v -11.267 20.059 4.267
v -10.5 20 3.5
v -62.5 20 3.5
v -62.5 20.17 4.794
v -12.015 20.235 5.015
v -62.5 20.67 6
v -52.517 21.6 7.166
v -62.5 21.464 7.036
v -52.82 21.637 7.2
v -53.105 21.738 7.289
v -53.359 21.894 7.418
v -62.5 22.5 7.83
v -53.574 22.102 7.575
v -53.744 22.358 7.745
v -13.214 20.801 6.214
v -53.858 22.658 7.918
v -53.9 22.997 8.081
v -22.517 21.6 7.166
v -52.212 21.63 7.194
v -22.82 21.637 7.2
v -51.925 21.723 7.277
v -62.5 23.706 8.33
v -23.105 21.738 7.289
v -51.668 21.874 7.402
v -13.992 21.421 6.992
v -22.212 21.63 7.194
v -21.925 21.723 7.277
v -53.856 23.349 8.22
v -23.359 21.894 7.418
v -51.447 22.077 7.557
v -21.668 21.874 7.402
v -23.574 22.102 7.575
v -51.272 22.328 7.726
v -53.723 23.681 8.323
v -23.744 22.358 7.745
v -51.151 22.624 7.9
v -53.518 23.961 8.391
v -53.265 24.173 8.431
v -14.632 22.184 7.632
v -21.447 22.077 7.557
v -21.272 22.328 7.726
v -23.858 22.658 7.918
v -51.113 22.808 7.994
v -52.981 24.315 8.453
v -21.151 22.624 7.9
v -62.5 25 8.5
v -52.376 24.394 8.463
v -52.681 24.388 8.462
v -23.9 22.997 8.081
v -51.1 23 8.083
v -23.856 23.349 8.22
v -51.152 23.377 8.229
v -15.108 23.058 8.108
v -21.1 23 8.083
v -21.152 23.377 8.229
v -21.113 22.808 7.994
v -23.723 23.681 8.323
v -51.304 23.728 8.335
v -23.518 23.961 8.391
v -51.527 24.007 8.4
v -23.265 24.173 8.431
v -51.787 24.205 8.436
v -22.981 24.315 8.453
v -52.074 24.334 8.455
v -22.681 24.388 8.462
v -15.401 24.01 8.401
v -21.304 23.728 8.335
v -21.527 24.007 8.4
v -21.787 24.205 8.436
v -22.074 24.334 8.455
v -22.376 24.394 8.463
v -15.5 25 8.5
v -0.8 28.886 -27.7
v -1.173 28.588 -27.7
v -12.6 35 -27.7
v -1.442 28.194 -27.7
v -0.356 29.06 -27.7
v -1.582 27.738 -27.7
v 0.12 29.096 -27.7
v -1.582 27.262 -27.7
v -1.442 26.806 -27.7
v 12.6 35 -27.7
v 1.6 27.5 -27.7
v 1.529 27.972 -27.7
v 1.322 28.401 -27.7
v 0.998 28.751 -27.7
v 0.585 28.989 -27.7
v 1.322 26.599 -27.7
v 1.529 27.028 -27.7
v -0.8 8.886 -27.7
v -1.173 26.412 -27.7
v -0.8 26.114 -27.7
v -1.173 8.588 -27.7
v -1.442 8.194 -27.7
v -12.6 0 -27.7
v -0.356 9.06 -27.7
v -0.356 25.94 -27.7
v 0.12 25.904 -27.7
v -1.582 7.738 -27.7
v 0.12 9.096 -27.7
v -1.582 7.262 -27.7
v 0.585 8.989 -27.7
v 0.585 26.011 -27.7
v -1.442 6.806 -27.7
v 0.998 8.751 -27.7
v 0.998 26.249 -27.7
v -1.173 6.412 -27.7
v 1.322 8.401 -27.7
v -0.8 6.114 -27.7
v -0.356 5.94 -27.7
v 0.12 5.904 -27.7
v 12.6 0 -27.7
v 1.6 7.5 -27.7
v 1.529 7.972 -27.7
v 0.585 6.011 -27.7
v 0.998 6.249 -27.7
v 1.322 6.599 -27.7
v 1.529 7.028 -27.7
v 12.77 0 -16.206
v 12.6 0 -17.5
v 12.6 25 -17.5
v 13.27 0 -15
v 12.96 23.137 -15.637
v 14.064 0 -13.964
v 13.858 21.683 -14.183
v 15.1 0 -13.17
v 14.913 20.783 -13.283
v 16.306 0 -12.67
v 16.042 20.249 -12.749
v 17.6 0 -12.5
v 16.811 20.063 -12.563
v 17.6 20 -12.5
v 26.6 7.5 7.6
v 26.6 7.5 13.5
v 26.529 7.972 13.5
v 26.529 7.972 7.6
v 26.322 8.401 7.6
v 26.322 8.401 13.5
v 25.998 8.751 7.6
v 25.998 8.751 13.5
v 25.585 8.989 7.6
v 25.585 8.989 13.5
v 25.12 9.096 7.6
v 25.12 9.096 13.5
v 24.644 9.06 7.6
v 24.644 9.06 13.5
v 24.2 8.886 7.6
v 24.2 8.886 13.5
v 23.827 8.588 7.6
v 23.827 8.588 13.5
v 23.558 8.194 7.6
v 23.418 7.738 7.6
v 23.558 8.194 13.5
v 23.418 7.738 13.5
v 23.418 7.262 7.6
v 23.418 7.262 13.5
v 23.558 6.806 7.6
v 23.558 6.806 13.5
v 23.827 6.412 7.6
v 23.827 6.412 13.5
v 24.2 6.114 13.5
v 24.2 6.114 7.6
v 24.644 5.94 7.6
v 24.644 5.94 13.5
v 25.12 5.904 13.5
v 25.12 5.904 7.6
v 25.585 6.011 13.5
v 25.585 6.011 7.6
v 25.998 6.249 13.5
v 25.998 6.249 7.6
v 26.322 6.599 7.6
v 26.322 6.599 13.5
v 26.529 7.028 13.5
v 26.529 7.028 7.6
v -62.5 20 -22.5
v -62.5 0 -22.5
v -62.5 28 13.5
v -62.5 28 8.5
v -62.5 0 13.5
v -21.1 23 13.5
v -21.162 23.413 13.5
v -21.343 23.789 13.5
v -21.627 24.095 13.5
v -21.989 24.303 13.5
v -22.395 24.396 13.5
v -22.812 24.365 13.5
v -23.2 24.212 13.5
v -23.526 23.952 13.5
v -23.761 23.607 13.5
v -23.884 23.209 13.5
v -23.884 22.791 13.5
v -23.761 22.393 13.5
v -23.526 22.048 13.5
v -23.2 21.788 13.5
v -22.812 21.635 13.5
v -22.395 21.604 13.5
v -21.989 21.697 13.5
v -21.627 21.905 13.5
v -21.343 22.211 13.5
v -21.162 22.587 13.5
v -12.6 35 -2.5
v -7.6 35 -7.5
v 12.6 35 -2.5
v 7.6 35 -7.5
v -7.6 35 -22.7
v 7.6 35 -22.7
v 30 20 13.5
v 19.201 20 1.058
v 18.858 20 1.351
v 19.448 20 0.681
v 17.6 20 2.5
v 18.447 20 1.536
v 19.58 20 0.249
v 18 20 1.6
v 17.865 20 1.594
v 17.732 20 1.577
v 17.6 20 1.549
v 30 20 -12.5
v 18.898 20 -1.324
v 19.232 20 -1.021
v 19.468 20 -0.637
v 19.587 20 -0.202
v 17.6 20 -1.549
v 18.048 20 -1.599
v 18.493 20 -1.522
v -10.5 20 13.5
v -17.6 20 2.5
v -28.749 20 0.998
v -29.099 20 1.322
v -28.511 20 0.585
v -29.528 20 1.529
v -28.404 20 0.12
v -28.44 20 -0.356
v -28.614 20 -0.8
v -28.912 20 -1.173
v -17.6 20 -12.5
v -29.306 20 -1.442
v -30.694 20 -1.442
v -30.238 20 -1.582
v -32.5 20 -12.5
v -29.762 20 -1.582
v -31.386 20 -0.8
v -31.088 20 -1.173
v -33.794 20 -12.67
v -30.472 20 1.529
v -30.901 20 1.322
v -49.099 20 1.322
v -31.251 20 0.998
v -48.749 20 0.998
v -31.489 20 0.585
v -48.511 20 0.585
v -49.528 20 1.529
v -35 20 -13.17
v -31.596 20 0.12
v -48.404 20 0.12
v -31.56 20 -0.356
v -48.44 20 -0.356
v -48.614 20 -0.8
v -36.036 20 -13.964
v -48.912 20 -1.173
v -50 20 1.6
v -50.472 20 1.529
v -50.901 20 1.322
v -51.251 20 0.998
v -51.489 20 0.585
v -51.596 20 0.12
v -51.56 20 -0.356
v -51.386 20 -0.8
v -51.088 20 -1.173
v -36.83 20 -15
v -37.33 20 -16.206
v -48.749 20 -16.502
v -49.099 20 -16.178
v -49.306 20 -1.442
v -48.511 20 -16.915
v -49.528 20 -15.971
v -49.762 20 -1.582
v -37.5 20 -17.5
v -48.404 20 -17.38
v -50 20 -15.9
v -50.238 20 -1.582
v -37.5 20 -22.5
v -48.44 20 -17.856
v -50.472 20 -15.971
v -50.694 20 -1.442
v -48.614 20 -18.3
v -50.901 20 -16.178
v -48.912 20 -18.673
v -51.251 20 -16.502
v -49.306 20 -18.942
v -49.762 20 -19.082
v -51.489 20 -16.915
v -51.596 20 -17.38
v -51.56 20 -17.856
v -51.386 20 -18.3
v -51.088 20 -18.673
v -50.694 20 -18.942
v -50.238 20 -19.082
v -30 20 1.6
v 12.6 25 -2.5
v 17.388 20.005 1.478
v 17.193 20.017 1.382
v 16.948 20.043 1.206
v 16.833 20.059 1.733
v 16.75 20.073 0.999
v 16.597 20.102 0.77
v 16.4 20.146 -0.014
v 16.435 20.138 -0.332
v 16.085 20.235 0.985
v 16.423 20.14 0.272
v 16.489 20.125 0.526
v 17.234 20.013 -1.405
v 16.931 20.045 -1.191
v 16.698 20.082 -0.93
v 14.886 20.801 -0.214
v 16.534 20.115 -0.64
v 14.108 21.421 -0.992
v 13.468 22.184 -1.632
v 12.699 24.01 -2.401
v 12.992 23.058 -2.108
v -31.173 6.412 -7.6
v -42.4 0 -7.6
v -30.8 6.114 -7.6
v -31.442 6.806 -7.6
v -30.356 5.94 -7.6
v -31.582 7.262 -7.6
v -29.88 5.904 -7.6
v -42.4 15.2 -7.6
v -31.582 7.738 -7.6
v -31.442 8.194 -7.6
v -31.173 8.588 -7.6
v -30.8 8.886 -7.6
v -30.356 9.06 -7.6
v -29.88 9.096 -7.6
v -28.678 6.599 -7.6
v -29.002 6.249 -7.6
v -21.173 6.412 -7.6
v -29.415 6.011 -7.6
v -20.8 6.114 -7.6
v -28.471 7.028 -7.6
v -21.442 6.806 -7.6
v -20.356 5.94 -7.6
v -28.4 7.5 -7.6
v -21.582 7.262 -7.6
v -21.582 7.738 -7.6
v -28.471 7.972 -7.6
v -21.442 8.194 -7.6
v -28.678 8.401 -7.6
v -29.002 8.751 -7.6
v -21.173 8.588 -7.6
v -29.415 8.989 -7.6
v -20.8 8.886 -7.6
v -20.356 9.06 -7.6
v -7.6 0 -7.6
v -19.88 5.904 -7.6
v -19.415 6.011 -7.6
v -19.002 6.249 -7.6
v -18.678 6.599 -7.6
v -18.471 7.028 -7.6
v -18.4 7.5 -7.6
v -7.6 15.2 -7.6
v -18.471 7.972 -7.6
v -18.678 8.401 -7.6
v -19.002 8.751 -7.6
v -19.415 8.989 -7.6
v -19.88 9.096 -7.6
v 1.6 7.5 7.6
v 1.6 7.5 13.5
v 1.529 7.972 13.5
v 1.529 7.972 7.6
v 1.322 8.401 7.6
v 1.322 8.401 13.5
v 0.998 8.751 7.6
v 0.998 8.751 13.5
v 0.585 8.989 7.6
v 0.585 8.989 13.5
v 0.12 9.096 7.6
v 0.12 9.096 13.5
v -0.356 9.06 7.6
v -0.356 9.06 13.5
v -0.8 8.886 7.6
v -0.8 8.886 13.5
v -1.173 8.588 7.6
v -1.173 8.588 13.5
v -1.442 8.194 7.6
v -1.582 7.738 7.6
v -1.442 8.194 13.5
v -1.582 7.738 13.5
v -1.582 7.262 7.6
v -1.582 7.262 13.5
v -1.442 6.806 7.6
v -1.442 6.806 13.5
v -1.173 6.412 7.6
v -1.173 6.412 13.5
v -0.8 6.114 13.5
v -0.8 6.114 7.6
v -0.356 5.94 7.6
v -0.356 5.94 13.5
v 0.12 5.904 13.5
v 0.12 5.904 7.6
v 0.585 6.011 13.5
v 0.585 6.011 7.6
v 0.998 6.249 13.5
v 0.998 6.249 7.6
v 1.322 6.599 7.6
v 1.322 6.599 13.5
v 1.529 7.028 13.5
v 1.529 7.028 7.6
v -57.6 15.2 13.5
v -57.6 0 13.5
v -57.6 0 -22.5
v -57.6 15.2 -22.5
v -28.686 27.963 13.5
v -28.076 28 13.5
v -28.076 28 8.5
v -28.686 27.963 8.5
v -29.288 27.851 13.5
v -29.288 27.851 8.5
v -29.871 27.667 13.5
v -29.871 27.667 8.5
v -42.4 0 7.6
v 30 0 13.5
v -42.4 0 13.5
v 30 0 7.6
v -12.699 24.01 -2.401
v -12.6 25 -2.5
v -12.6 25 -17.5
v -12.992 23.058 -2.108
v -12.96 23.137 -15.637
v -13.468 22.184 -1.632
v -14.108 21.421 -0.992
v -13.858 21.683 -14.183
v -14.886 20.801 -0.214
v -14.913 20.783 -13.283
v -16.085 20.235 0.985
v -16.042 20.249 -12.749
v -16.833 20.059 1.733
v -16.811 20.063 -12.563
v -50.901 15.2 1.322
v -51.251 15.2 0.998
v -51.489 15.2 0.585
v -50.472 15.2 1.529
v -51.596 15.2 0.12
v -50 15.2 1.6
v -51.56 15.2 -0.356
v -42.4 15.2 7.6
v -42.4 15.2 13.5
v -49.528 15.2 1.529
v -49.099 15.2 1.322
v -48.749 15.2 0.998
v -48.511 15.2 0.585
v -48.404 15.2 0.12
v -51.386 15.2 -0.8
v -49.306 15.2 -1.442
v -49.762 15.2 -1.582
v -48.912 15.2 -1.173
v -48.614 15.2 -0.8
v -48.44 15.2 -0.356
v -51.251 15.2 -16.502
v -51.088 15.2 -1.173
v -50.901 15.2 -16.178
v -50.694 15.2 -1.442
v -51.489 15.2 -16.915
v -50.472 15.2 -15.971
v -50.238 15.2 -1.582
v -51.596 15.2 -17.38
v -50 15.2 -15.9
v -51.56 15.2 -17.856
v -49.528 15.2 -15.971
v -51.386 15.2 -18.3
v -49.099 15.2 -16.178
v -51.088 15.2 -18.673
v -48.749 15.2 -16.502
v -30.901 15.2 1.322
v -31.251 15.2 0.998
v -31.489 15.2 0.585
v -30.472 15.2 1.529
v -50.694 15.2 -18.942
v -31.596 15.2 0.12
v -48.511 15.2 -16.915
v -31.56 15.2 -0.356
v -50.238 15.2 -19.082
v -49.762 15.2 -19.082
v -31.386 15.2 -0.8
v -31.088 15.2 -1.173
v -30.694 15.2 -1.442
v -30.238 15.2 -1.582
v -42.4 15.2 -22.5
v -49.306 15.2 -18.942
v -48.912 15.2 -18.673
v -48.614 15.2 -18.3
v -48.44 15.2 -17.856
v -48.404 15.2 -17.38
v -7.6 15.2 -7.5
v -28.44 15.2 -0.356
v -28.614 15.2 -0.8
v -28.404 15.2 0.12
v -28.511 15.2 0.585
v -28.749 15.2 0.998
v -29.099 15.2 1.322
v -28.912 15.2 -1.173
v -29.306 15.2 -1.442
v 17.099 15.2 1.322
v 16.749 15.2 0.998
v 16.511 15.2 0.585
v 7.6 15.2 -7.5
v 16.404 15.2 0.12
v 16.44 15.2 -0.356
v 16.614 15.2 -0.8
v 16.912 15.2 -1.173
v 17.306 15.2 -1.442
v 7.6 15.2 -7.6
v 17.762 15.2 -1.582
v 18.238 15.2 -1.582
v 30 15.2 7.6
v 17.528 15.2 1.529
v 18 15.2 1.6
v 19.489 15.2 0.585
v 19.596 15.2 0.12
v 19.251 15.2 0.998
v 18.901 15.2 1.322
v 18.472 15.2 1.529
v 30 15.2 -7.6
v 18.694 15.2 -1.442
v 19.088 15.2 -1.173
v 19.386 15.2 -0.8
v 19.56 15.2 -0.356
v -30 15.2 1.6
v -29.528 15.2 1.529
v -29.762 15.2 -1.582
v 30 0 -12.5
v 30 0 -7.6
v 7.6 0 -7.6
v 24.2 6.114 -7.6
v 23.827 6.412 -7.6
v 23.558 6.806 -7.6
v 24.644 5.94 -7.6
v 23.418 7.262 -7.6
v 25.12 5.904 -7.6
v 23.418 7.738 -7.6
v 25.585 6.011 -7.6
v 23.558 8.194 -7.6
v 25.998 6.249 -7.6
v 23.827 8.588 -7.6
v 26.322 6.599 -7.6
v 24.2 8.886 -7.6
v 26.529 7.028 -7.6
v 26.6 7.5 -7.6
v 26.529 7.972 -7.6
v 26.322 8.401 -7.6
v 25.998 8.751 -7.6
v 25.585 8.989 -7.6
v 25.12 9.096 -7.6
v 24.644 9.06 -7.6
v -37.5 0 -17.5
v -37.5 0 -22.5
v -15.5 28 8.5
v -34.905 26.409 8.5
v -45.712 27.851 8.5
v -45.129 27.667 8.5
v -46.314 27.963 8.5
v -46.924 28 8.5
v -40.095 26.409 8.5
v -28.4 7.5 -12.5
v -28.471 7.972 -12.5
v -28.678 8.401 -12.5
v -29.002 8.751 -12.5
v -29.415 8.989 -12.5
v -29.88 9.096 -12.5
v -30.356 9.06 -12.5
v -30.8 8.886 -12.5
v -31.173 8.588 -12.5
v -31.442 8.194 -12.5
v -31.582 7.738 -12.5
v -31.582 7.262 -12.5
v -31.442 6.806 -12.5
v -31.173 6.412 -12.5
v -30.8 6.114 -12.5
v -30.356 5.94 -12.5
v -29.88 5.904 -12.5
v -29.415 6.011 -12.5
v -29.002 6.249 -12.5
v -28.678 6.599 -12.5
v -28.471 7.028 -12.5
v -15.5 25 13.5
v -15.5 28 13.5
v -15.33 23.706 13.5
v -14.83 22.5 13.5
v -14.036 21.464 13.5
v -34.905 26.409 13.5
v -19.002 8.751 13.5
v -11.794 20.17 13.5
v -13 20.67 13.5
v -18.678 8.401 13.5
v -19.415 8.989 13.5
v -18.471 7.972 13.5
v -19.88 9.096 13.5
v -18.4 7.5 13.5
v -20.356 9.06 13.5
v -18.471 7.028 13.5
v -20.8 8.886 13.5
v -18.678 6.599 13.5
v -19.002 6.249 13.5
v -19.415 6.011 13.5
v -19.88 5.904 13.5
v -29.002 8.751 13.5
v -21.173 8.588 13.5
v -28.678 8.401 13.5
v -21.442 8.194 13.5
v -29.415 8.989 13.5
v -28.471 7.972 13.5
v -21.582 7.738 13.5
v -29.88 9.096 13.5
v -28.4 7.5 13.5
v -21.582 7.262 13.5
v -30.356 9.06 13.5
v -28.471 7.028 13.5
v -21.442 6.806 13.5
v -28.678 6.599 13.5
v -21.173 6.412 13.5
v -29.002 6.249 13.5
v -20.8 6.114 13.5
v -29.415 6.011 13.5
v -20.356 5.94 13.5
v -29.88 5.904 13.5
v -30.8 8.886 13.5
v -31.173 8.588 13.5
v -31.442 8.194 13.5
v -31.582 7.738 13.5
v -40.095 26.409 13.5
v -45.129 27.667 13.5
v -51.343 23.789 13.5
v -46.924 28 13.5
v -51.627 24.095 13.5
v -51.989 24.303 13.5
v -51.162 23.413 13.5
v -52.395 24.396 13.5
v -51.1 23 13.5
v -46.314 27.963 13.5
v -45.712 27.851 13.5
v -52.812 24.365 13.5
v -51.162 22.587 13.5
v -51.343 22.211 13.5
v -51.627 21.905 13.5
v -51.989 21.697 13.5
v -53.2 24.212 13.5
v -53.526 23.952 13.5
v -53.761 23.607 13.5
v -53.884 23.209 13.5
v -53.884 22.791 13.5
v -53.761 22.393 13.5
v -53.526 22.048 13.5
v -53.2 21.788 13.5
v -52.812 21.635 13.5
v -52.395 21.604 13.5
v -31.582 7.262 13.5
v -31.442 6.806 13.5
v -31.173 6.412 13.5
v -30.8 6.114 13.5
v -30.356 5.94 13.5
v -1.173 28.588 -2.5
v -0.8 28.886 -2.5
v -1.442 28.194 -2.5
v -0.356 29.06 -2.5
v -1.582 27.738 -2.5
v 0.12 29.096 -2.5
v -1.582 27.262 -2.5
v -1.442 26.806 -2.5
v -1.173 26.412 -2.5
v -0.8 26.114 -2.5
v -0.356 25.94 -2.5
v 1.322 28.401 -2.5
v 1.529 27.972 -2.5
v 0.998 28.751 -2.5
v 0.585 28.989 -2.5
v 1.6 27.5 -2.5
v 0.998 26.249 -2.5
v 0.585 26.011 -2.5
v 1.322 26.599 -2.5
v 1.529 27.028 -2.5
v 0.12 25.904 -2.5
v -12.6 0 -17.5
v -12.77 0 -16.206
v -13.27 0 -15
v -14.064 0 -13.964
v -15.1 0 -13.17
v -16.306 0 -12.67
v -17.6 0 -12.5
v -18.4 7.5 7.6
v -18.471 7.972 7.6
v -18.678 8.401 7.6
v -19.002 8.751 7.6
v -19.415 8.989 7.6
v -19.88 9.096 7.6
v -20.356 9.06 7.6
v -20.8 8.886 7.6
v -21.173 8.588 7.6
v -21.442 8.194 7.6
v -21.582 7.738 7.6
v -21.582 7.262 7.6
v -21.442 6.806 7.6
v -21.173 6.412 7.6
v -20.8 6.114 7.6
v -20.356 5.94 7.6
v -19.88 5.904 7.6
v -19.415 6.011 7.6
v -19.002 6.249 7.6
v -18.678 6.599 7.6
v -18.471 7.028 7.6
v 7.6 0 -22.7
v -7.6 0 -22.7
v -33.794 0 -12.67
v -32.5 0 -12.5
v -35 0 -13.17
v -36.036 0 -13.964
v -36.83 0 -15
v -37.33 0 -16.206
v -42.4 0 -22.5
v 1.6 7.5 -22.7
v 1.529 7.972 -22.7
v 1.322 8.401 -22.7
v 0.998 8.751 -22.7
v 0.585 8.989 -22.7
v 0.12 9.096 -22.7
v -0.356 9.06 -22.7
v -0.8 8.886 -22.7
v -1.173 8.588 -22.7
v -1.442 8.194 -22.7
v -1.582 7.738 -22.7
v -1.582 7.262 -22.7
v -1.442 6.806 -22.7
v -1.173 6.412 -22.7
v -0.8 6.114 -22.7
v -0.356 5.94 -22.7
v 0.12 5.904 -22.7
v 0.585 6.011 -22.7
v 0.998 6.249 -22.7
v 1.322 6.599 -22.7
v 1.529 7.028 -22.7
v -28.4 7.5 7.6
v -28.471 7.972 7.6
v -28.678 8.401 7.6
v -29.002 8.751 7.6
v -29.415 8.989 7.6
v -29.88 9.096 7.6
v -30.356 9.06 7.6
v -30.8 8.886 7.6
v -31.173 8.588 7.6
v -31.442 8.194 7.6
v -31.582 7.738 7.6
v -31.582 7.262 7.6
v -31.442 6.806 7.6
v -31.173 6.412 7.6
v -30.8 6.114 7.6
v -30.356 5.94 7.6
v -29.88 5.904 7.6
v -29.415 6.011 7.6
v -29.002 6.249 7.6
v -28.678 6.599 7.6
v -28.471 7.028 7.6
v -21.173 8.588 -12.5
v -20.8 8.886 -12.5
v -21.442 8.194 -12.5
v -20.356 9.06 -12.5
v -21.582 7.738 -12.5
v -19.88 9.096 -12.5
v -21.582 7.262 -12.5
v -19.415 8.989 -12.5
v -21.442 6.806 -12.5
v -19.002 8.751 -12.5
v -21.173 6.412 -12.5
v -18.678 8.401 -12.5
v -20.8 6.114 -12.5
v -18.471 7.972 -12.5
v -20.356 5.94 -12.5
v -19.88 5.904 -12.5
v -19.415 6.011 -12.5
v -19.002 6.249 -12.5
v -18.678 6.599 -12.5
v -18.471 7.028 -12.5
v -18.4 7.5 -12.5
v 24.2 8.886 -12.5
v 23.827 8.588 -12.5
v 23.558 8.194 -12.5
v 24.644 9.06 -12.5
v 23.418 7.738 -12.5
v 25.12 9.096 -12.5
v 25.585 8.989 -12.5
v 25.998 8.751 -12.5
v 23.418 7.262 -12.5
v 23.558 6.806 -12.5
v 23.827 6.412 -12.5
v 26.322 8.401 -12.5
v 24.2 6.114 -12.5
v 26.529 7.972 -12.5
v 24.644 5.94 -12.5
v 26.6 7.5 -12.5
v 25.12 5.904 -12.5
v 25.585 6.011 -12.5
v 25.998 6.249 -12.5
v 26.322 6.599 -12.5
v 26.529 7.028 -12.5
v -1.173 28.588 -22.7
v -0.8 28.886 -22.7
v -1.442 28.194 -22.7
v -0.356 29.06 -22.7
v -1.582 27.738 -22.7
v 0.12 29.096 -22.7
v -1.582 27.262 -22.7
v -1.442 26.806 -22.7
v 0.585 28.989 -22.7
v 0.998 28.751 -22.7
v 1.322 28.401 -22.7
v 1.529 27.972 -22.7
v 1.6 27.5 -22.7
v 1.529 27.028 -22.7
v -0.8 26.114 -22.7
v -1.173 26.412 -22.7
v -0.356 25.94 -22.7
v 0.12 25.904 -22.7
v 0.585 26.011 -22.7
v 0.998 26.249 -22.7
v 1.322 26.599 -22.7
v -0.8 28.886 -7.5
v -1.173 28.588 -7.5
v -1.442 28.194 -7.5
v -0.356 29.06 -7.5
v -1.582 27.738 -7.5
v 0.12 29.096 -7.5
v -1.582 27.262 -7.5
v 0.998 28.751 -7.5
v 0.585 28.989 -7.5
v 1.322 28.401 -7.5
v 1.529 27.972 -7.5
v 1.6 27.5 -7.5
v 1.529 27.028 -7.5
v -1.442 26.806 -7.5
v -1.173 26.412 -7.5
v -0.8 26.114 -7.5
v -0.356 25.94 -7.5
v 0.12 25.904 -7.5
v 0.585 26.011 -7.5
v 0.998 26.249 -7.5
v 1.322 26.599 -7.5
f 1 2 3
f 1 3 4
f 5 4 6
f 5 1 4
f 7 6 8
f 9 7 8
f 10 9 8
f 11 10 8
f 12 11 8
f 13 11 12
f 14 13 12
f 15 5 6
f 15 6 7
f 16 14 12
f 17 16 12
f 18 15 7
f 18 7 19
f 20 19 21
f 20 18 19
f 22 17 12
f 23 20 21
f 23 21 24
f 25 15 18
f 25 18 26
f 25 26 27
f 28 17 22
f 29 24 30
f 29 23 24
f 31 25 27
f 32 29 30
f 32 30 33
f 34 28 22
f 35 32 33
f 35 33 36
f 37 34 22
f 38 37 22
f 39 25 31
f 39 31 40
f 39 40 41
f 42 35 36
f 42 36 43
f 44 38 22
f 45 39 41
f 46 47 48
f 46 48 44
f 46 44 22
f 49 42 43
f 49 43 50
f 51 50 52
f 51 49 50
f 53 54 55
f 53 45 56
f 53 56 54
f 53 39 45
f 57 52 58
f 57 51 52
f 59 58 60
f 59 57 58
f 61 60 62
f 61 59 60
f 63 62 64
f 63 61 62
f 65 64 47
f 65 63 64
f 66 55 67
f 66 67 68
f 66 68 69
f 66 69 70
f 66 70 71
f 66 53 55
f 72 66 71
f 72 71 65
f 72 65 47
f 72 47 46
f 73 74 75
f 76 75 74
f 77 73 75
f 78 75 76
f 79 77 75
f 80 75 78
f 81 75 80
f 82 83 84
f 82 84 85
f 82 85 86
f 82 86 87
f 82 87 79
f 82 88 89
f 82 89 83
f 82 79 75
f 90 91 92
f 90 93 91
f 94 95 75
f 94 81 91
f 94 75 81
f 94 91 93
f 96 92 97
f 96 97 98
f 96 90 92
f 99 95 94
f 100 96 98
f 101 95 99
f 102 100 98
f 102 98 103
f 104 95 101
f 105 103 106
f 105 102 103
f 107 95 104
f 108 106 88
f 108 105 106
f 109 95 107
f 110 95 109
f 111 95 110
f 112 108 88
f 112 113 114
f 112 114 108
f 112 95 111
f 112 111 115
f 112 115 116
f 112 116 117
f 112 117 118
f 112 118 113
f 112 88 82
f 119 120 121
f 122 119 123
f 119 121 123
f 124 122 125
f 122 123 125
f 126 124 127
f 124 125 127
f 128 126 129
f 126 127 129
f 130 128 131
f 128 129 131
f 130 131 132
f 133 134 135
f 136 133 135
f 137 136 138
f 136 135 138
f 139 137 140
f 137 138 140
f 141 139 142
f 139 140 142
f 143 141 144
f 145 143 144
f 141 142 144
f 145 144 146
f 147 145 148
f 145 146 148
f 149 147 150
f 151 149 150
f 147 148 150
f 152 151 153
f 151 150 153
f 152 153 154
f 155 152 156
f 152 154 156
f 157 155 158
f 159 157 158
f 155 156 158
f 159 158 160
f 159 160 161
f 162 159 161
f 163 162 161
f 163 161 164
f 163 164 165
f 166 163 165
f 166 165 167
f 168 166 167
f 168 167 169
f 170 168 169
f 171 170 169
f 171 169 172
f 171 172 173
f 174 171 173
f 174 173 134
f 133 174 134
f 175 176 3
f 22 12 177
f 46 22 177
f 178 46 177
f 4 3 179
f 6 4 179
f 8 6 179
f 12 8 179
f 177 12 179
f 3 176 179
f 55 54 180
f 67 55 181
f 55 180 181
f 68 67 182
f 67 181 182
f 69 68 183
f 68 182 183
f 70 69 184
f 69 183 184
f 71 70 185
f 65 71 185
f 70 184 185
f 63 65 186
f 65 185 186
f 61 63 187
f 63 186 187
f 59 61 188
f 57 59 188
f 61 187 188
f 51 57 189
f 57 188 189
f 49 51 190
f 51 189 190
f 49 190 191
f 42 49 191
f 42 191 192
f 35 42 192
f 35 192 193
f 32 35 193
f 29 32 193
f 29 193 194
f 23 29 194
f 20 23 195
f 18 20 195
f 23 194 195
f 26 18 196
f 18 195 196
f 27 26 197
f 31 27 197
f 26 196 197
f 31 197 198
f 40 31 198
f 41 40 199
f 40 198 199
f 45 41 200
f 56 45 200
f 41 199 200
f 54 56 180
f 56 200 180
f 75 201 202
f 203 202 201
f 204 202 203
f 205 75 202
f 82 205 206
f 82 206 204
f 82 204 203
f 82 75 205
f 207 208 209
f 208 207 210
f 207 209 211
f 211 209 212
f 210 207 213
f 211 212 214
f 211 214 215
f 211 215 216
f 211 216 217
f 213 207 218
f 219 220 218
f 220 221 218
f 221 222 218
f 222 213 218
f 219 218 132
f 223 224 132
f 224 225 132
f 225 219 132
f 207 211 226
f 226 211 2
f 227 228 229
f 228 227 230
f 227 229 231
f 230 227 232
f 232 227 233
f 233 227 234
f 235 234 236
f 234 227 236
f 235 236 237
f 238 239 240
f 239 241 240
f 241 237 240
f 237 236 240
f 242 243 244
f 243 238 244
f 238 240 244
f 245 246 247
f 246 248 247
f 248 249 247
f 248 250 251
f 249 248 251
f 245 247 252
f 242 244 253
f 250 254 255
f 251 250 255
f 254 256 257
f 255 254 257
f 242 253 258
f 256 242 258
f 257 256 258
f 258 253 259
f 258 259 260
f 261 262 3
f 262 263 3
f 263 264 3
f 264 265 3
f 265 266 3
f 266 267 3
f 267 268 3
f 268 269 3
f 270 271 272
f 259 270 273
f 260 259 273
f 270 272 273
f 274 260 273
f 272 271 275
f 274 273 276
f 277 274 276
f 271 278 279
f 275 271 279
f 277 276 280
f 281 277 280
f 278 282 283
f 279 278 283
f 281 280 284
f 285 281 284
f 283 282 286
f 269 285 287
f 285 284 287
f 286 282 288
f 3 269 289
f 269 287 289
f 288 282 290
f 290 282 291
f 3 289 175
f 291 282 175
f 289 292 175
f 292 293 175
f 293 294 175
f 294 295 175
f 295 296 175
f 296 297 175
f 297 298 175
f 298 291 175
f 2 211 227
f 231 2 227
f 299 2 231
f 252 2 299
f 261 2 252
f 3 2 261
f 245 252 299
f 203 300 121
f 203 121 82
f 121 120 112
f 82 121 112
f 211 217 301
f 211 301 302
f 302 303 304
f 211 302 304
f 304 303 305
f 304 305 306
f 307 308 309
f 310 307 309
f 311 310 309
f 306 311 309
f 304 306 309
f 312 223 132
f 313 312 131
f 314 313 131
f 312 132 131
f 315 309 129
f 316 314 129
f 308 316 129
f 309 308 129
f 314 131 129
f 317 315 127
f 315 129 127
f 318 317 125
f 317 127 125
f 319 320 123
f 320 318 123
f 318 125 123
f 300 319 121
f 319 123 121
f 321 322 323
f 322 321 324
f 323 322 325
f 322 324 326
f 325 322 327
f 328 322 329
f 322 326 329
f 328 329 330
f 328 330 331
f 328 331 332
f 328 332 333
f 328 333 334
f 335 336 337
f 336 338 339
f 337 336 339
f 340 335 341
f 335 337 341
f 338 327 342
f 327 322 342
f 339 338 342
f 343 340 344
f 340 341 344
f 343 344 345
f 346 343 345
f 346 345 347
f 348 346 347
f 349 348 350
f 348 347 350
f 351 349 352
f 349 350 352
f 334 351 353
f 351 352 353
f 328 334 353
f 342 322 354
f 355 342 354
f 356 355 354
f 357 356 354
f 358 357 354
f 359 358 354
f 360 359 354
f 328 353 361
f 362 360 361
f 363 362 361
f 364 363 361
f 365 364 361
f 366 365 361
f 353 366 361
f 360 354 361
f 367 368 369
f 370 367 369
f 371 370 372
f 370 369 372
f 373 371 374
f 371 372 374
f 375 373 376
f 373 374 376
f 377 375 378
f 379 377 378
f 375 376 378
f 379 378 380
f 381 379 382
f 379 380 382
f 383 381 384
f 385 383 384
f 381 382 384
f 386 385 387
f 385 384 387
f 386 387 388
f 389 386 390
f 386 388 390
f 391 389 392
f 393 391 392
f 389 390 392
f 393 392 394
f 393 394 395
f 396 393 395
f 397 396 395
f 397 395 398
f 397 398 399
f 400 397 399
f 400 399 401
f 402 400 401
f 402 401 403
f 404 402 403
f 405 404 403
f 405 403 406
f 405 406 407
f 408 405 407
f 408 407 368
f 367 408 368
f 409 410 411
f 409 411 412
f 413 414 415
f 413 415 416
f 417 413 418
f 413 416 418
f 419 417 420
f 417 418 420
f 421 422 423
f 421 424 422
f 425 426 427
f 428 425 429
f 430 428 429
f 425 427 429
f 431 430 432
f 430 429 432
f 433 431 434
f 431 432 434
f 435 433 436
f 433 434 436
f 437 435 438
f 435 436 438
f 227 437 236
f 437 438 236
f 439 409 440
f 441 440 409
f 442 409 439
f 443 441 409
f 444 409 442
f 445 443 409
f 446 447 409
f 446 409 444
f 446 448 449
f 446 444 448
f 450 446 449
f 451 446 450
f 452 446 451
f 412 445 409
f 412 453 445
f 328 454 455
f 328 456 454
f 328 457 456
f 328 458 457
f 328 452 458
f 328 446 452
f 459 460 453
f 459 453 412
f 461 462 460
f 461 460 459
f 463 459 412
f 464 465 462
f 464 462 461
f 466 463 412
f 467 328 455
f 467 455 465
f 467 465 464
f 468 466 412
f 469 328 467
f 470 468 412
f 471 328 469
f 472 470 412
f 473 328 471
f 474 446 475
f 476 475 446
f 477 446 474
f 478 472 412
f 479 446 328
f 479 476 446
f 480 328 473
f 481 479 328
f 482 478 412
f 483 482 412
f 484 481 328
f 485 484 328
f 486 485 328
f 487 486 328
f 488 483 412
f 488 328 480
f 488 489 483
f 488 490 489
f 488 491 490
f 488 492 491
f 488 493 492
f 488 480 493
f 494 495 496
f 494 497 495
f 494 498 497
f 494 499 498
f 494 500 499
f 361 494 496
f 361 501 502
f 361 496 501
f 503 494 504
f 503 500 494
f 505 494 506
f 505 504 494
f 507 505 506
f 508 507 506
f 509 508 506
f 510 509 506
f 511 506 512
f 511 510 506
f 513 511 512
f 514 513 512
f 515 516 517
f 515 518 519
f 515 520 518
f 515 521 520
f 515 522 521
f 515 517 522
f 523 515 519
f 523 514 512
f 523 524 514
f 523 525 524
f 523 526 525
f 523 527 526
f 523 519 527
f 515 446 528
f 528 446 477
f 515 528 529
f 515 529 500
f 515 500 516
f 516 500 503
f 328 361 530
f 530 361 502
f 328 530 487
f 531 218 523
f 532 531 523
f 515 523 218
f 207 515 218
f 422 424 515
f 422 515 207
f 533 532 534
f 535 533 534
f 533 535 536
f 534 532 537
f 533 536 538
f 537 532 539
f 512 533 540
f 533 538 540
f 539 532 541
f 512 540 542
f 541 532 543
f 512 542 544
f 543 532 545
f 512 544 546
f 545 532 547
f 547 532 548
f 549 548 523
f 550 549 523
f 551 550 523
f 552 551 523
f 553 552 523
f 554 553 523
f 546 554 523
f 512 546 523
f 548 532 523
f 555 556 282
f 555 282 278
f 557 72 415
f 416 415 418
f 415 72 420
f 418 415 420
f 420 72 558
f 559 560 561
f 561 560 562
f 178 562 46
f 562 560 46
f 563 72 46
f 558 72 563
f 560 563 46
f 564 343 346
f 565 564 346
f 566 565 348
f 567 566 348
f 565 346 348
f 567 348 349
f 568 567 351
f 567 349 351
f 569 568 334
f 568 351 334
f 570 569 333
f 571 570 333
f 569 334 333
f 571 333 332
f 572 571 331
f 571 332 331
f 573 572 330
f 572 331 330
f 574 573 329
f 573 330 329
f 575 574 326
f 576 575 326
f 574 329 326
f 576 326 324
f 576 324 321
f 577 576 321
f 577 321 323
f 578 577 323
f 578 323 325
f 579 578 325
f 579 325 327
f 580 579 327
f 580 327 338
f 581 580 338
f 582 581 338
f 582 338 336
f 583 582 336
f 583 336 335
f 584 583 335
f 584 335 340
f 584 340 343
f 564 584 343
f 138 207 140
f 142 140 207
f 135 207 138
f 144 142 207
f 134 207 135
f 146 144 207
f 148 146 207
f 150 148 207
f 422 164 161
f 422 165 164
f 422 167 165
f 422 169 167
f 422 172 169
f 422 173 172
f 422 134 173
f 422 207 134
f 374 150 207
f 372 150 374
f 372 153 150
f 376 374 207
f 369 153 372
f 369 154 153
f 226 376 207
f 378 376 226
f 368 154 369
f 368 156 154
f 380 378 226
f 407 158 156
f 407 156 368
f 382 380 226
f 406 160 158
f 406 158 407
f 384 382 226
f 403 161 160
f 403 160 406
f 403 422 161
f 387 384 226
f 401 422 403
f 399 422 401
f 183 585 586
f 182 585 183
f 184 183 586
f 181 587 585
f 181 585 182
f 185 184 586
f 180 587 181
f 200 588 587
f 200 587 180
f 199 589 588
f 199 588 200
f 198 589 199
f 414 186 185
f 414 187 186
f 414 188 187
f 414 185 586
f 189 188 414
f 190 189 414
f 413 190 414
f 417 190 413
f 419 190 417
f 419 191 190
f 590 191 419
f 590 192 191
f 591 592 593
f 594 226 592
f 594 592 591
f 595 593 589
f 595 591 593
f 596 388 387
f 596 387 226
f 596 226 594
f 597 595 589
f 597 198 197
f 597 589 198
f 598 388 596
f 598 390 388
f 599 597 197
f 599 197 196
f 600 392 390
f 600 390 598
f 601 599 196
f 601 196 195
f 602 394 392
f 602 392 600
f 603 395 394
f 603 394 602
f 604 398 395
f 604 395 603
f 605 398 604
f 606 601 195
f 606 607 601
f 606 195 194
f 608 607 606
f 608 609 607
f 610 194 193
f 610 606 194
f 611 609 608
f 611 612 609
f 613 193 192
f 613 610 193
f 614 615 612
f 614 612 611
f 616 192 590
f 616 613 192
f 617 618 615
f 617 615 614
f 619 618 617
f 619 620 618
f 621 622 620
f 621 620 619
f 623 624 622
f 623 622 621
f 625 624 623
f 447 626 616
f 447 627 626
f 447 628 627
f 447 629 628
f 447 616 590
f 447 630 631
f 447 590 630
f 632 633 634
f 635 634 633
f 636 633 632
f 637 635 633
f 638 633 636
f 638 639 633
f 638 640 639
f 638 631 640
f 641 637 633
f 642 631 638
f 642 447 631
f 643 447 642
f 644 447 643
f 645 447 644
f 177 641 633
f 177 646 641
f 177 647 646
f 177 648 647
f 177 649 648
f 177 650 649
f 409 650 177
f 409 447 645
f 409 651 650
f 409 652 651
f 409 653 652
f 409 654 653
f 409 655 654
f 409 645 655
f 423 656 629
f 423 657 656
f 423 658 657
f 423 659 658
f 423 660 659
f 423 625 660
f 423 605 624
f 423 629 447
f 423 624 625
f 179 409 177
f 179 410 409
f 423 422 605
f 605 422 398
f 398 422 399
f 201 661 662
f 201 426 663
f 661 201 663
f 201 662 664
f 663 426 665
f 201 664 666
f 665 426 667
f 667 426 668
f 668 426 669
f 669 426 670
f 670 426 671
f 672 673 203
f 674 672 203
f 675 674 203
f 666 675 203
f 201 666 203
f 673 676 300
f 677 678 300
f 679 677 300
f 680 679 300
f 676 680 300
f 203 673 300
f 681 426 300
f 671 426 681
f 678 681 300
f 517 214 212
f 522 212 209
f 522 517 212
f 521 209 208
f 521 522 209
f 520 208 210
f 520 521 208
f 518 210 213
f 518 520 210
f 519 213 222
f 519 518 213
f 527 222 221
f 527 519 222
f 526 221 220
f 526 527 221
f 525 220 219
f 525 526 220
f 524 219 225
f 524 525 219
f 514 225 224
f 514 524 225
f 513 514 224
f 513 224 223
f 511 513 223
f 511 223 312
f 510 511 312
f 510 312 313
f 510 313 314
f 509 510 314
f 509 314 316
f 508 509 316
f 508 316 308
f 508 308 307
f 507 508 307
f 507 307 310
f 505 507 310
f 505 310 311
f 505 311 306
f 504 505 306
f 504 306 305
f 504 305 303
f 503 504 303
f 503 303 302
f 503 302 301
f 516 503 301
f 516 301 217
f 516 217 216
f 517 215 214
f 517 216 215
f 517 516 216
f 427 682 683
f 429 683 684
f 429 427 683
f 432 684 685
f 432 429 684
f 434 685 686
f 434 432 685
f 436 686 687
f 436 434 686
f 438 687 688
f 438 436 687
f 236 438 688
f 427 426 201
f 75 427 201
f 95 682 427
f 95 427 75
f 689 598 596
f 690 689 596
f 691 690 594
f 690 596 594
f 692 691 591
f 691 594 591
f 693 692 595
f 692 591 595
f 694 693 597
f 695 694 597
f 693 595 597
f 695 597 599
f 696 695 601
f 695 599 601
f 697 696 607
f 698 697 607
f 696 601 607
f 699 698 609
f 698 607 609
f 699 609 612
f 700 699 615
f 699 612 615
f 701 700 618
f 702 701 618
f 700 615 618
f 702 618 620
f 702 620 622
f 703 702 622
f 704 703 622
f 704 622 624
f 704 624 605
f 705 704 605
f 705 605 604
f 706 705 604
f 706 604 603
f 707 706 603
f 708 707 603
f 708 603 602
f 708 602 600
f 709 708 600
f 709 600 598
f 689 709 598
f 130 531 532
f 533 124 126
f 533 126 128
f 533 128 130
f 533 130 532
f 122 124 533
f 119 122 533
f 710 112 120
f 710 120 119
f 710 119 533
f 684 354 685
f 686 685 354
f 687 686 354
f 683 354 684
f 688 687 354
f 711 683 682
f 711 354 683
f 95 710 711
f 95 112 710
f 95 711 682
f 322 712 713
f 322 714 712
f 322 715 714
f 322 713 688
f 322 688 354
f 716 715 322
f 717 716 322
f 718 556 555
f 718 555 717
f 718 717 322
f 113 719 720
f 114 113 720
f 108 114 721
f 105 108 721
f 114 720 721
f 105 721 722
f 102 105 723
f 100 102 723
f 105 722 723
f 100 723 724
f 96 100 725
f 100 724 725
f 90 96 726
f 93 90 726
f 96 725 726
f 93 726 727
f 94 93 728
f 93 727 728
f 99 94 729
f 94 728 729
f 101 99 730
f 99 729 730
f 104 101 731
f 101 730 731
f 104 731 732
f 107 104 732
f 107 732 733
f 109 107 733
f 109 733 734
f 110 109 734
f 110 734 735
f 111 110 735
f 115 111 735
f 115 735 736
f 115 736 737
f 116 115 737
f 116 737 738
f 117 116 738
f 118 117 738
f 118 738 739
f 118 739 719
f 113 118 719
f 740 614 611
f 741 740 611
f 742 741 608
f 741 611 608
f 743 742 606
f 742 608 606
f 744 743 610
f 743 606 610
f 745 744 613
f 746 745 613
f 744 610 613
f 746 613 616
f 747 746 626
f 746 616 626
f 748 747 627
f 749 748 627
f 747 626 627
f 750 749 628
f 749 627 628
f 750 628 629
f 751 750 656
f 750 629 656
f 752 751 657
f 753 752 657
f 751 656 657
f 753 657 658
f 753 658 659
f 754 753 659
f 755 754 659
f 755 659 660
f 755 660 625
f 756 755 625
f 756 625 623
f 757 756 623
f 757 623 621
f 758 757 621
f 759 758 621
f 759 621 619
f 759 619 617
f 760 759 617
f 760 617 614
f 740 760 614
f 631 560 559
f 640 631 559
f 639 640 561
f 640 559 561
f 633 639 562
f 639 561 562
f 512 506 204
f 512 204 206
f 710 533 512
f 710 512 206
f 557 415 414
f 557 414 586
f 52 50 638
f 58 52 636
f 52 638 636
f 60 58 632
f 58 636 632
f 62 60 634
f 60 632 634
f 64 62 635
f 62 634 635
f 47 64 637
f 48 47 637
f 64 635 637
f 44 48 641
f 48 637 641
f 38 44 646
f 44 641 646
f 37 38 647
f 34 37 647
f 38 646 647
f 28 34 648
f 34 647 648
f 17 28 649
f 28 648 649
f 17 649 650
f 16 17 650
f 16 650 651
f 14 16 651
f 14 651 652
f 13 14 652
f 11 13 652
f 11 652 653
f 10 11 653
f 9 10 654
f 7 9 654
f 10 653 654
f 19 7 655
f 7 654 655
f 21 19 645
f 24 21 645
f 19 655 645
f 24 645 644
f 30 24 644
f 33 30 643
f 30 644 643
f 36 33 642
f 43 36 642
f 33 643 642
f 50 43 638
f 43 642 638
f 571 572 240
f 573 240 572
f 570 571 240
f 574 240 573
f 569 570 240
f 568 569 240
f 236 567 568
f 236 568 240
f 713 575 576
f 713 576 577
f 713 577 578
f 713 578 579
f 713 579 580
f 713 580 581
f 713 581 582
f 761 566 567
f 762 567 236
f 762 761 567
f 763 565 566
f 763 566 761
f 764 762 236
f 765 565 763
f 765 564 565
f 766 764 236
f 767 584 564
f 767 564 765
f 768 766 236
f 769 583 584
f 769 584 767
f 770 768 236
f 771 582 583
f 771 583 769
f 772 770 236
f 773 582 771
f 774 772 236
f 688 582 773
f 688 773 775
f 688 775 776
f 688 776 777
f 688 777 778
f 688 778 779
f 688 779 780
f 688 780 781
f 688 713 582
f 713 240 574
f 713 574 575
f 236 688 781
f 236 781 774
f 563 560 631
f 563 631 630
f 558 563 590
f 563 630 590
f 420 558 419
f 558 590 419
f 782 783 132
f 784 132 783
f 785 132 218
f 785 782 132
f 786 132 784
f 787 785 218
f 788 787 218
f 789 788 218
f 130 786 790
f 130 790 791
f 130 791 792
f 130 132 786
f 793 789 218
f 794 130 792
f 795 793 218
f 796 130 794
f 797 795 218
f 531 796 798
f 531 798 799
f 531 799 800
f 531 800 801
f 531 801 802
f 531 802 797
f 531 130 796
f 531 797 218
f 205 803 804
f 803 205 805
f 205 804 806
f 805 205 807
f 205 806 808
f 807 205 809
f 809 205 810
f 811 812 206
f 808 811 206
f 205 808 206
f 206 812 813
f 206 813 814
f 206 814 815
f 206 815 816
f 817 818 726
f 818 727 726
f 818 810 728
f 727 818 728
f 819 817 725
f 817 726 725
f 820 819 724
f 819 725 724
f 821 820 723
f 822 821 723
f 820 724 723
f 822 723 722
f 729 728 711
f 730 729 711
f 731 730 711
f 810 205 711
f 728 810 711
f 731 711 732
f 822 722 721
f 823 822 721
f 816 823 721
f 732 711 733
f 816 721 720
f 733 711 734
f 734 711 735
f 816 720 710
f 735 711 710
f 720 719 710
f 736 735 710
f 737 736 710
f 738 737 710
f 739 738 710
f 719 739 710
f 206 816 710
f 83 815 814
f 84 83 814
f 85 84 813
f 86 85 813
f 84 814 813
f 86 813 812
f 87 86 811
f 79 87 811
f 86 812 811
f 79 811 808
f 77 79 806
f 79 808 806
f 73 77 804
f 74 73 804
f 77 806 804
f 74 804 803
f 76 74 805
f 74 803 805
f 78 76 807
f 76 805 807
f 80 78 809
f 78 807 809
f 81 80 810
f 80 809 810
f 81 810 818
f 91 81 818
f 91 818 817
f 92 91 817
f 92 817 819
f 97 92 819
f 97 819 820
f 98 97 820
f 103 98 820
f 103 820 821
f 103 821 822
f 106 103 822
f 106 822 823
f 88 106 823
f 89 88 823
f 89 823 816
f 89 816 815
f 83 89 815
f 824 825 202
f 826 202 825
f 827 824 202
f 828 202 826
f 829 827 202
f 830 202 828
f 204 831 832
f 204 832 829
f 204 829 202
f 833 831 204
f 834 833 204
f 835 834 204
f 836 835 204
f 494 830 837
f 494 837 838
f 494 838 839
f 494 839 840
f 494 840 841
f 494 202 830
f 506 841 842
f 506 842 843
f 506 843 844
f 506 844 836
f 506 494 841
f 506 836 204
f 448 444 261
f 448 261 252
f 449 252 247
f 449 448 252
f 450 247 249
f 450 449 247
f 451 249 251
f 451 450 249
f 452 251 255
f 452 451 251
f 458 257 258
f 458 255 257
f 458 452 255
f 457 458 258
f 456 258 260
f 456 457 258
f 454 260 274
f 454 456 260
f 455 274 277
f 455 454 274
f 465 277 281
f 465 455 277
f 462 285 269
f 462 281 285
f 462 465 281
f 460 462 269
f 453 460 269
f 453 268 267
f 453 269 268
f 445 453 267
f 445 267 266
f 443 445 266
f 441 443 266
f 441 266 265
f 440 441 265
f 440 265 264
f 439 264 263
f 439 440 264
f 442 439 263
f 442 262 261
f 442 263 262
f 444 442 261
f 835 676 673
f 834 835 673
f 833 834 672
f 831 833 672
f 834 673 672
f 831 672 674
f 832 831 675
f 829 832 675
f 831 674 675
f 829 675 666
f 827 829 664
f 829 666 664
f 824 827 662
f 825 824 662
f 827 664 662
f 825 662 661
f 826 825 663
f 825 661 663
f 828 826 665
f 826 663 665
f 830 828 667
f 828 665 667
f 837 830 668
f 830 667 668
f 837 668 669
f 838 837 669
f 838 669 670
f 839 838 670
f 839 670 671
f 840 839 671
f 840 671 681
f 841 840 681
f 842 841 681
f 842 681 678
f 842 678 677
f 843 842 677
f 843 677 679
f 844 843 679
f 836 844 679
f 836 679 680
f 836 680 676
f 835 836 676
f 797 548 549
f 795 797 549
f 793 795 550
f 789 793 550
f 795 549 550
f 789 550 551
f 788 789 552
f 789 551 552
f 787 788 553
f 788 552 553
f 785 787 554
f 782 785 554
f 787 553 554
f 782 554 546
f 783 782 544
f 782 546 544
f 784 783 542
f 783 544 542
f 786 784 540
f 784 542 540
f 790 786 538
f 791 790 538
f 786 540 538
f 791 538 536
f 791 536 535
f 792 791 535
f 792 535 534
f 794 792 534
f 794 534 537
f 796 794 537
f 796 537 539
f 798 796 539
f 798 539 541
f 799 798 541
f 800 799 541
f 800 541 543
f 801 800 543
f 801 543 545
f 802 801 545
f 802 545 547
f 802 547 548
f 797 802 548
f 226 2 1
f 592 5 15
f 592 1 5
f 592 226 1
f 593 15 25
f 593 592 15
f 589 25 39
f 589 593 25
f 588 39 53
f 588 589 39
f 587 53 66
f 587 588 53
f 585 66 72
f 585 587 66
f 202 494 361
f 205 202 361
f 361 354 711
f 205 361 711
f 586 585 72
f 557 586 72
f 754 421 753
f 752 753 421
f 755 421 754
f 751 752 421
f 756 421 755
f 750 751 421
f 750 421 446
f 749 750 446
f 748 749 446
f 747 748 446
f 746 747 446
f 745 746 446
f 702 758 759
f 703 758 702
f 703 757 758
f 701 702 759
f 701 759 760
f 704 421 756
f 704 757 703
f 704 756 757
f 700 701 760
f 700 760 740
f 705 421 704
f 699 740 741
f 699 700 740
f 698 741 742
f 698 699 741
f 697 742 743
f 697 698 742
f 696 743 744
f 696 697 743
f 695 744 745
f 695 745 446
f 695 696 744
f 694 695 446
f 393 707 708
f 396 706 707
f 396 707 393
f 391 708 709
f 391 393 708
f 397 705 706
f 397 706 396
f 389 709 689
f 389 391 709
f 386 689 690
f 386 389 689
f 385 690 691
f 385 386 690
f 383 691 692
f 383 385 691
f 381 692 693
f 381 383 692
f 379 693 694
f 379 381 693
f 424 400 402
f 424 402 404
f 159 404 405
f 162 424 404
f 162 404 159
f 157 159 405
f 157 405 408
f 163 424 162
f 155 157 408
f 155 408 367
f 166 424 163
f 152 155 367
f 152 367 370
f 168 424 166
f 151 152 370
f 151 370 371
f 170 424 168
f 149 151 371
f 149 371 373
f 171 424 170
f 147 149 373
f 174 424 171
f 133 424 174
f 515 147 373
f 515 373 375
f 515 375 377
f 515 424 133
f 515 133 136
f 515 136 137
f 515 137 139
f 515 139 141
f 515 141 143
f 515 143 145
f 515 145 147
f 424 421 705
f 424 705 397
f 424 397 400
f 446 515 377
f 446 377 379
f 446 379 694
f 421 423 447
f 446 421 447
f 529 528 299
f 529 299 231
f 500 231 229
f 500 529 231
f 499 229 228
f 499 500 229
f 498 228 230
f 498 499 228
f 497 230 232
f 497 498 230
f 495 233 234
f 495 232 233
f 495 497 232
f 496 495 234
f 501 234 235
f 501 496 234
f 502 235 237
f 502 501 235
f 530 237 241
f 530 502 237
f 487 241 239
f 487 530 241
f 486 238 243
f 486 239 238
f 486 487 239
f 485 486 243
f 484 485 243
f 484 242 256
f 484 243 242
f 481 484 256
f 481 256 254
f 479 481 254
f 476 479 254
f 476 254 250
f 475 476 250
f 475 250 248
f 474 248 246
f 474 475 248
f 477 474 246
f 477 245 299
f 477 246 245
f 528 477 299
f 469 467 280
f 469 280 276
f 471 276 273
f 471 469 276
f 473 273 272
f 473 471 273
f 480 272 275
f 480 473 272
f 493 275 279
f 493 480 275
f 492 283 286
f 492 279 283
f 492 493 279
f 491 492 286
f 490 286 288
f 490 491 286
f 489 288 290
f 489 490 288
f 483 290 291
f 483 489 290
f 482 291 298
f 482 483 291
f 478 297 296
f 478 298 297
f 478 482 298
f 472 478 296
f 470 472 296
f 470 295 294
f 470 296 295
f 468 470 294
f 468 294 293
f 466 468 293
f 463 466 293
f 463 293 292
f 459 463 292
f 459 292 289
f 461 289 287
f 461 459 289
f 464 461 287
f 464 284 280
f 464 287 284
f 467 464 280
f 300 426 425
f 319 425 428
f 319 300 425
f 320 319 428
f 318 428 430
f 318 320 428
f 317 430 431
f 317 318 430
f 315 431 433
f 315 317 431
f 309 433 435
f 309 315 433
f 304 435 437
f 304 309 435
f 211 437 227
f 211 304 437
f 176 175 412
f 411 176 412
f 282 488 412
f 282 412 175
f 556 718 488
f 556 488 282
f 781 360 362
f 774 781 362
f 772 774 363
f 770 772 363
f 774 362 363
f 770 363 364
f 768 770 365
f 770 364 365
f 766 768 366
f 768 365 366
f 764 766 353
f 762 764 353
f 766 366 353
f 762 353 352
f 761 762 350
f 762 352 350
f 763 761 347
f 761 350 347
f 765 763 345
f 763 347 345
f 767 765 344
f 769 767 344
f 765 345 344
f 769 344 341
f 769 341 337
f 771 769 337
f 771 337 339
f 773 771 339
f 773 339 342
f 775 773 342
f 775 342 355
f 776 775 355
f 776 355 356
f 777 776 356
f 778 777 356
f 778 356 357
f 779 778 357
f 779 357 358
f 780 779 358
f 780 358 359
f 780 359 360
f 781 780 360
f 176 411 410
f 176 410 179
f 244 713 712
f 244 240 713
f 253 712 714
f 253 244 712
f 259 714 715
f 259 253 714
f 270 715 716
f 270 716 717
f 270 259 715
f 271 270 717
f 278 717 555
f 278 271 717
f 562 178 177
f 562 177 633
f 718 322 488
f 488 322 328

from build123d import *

# Parameters (mm, degrees)
SKETCH_1_W               = 15.2
SKETCH_1_H               = 15.2
EXTRUDE_1_DEPTH          = 20
SKETCH_2_W               = 25.2
SKETCH_2_H               = 25.2
SKETCH_2_W_2             = 15.2
SKETCH_2_H_2             = 15.2
EXTRUDE_2_DEPTH          = 15
SKETCH_3_W               = 15.2
SKETCH_3_H               = 15.2
CUT_EXTRUDE_1_DEPTH      = 80
SKETCH_4_R               = 1.6
CUT_EXTRUDE_2_DEPTH      = 83.635888087
FILLET_1_R               = 5
SKETCH_5_W               = 15.2
SKETCH_5_H               = 15.2
CUT_EXTRUDE_3_DEPTH      = 83.635888087
CUT_EXTRUDE_5_DEPTH      = 72.228786316
CUT_EXTRUDE_5_DEPTH_BACK = 72.228786316
SKETCH_7_R               = 1.6
SKETCH_8_W               = 47
SKETCH_8_H               = 5
EXTRUDE_3_DEPTH          = 8
CUT_EXTRUDE_6_REACH      = 84.636
SKETCH_9_R               = 21.25
SKETCH_9_R_2             = 1.4
FILLET_2_R               = 5


with BuildPart() as part:
    # 草图1 → 凸台-拉伸1 (new body)
    with BuildSketch(Plane(origin=(0, 0, 0), x_dir=(1, 0, 0), z_dir=(0, 1, 0))):
        Polygon((-37.5, 12.5), (-12.6, 12.5), (-12.6, 27.7), (12.6, 27.7), (12.6, 12.5), (30, 12.5), (30, -13.5), (-62.5, -13.5), (-62.5, 22.5), (-37.5, 22.5), align=None)
        with Locations((0, 15.1)):
            Rectangle(SKETCH_1_W, SKETCH_1_H, mode=Mode.SUBTRACT)
    extrude(amount=EXTRUDE_1_DEPTH)

    # 草图2 → 凸台-拉伸2 (add)
    with BuildSketch(Plane(origin=(0, 20, 0), x_dir=(1, 0, 0), z_dir=(0, 1, 0))):
        with Locations((0, 15.1)):
            Rectangle(SKETCH_2_W, SKETCH_2_H)
        with Locations((0, 15.1)):
            Rectangle(SKETCH_2_W_2, SKETCH_2_H_2, mode=Mode.SUBTRACT)
    extrude(amount=EXTRUDE_2_DEPTH)

    # 草图3 → 切除-拉伸1 (cut)
    with BuildSketch(Plane(origin=(30, 0, 0), x_dir=(0, 0, -1), z_dir=(1, 0, 0))):
        with Locations((0, 7.6)):
            Rectangle(SKETCH_3_W, SKETCH_3_H)
    extrude(amount=-CUT_EXTRUDE_1_DEPTH, mode=Mode.SUBTRACT)

    # 草图4 → 切除-拉伸2 (cut, through all)
    with BuildSketch(Plane.XY.offset(13.5)):
        with Locations((0, 7.5)):
            Circle(SKETCH_4_R)
        with Locations((25, 7.5)):
            Circle(SKETCH_4_R)
        with Locations((-20, 7.5)):
            Circle(SKETCH_4_R)
        with Locations((0, 27.5)):
            Circle(SKETCH_4_R)
        with Locations((-30, 7.5)):
            Circle(SKETCH_4_R)
    extrude(amount=-CUT_EXTRUDE_2_DEPTH, mode=Mode.SUBTRACT)

    # 圆角1
    fillet_1_edges = [part.edges().sort_by_distance(p)[0] for p in [
        (-37.5, 10, -12.5),
        (-12.6, 10, -12.5),
        (12.6, 10, -12.5),
        (-12.6, 20, -7.5),
        (0, 20, -2.5),
        (12.6, 20, -7.5),
    ]]
    fillet(fillet_1_edges, radius=FILLET_1_R)

    # 草图5 → 切除-拉伸3 (cut, through all)
    with BuildSketch(Plane.XY.offset(13.5)):
        with Locations((-50, 7.6)):
            Rectangle(SKETCH_5_W, SKETCH_5_H)
    extrude(amount=-CUT_EXTRUDE_3_DEPTH, mode=Mode.SUBTRACT)

    # 草图7 → 切除-拉伸5 (cut, two sides: drawn at the far end of the back side and taken through both)
    with BuildSketch(Plane(origin=(0, 20, 0), x_dir=(1, 0, 0), z_dir=(0, 1, 0)).offset(-CUT_EXTRUDE_5_DEPTH_BACK)):
        with Locations(Location((-50, 0, 0), (0, 0, 270))):
            Circle(SKETCH_7_R)
        with Locations(Location((-30, 0, 0), (0, 0, 270))):
            Circle(SKETCH_7_R)
        with Locations(Location((18, 0, 0), (0, 0, 270))):
            Circle(SKETCH_7_R)
        with Locations(Location((-50, 17.5, 0), (0, 0, 270))):
            Circle(SKETCH_7_R)
    extrude(amount=CUT_EXTRUDE_5_DEPTH + CUT_EXTRUDE_5_DEPTH_BACK, mode=Mode.SUBTRACT)

    # 草图8 → 凸台-拉伸3 (add)
    with BuildSketch(Plane(origin=(0, 20, 0), x_dir=(1, 0, 0), z_dir=(0, 1, 0))):
        with Locations((-39, -11)):
            Rectangle(SKETCH_8_W, SKETCH_8_H)
    extrude(amount=EXTRUDE_3_DEPTH)

    # 草图9 → 切除-拉伸6 (cut, up to next)
    with BuildSketch(Plane.XY.offset(13.5), mode=Mode.PRIVATE) as cut_extrude_6_sk1:
        with Locations((-37.5, 47.5)):
            Circle(SKETCH_9_R)
    cut_extrude_6_tool1 = extrude(cut_extrude_6_sk1.sketch, amount=-CUT_EXTRUDE_6_REACH, mode=Mode.PRIVATE) & part.part
    # 草图9 → 切除-拉伸6 (cut, up to next)
    with BuildSketch(Plane.XY.offset(13.5), mode=Mode.PRIVATE) as cut_extrude_6_sk2:
        with Locations((-52.5, 23)):
            Circle(SKETCH_9_R_2)
    cut_extrude_6_tool2 = extrude(cut_extrude_6_sk2.sketch, amount=-CUT_EXTRUDE_6_REACH, mode=Mode.PRIVATE) & part.part
    # 草图9 → 切除-拉伸6 (cut, up to next)
    with BuildSketch(Plane.XY.offset(13.5), mode=Mode.PRIVATE) as cut_extrude_6_sk3:
        with Locations((-22.5, 23)):
            Circle(SKETCH_9_R_2)
    cut_extrude_6_tool3 = extrude(cut_extrude_6_sk3.sketch, amount=-CUT_EXTRUDE_6_REACH, mode=Mode.PRIVATE) & part.part
    add(cut_extrude_6_tool1.solids().sort_by_distance((-37.5, 47.5, 13.5))[0], mode=Mode.SUBTRACT)
    add(cut_extrude_6_tool2.solids().sort_by_distance((-52.5, 23, 13.5))[0], mode=Mode.SUBTRACT)
    add(cut_extrude_6_tool3.solids().sort_by_distance((-22.5, 23, 13.5))[0], mode=Mode.SUBTRACT)

    # 圆角2
    # the kernel refuses this fillet: 5 mm, written as the material it adds along each edge
    with BuildSketch(Plane(origin=(-15.5, 20, 13.5), x_dir=(1, 0, 0), z_dir=(0, 0, -1))) as fillet_2_piece_1:
        with BuildLine():
            CenterArc((FILLET_2_R, -FILLET_2_R), FILLET_2_R, 90, 90)
            Line((0, -FILLET_2_R), (0, 0))
            Line((0, 0), (FILLET_2_R, 0))
        make_face()
    extrude(amount=5)
    with BuildSketch(Plane(origin=(-15.5, 20, 8.5), x_dir=(0, 0, -1), z_dir=(-1, 0, 0))) as fillet_2_piece_2_section:
        with BuildLine():
            CenterArc((FILLET_2_R, -FILLET_2_R), FILLET_2_R, 90, 90)
            Line((0, -FILLET_2_R), (0, 0))
            Line((0, 0), (FILLET_2_R, 0))
        make_face()
    fillet_2_piece_2 = extrude(amount=47, mode=Mode.PRIVATE)
    fillet_2_piece_2 = fillet_2_piece_2 - Plane(origin=(-22.5, 23, 7.347121569), x_dir=(1, 0, 0), z_dir=(0, 0, 1)) * Cylinder(1.4, 114, mode=Mode.PRIVATE)
    fillet_2_piece_2 = fillet_2_piece_2 - Plane(origin=(-52.5, 23, 7.347121569), x_dir=(1, 0, 0), z_dir=(0, 0, 1)) * Cylinder(1.4, 114, mode=Mode.PRIVATE)
    add(fillet_2_piece_2)
    with BuildSketch(Plane(origin=(-3, 20, 8.5), x_dir=(0, 0, -1), z_dir=(-1, 0, 0))) as fillet_2_piece_3a_section:
        with BuildLine():
            CenterArc((FILLET_2_R, -FILLET_2_R), FILLET_2_R, 90, 90)
            Line((0, -FILLET_2_R), (0, 0))
            Line((0, 0), (FILLET_2_R, 0))
        make_face()
    fillet_2_piece_3a = extrude(amount=59.5, mode=Mode.PRIVATE)
    fillet_2_piece_3a = split(fillet_2_piece_3a, bisect_by=Plane(origin=(-15.5, 21.131975571, 7.368024429), z_dir=(1, 0, 0)), keep=Keep.TOP, mode=Mode.PRIVATE)
    with BuildSketch(Plane(origin=(-15.5, 20, 13.5), x_dir=(1, 0, 0), z_dir=(0, 0, -1))) as fillet_2_piece_3b_section:
        with BuildLine():
            CenterArc((FILLET_2_R, -FILLET_2_R), FILLET_2_R, 90, 90)
            Line((0, -FILLET_2_R), (0, 0))
            Line((0, 0), (FILLET_2_R, 0))
        make_face()
    fillet_2_piece_3b = extrude(amount=17.5, mode=Mode.PRIVATE)
    fillet_2_piece_3b = split(fillet_2_piece_3b, bisect_by=Plane(origin=(-14.368024429, 21.131975571, 8.5), z_dir=(0, 0, -1)), keep=Keep.TOP, mode=Mode.PRIVATE)
    fillet_2_piece_3 = fillet_2_piece_3a & fillet_2_piece_3b
    add(fillet_2_piece_3)
    # the kernel refuses this fillet: 5 mm, written as the material it takes off along each edge
    with BuildSketch(Plane(origin=(-29.055327123, 28, 6.051586161), x_dir=(-0.9256891824228564, -0.378284995136344, 0), z_dir=(0, 0, 1))) as fillet_2_2_piece_1:
        with BuildLine():
            CenterArc((0.984836894, 4.998925199), FILLET_2_R, 247.772508302, 21.039469781)
            Line((-0.906588082, 0.370479287), (0, 0))
            ThreePointArc((0, 0), (0.440584926, 0.004567905), (0.881169852, 0))
        make_face()
    extrude(amount=9.896827677, mode=Mode.SUBTRACT)
    with BuildSketch(Plane(origin=(-45.944672877, 28, 6.051586161), x_dir=(-1, 0, 0), z_dir=(0, 0, 1))) as fillet_2_2_piece_2:
        with BuildLine():
            CenterArc((0.979365535, 5), FILLET_2_R, 248.960530219, 21.039469781)
            ThreePointArc((-0.8156894, 0.333333333), (-0.40611673, 0.170895126), (0, 0))
            Line((0, 0), (0.979365535, 0))
        make_face()
    extrude(amount=9.896827677, mode=Mode.SUBTRACT)


solid = part.part
